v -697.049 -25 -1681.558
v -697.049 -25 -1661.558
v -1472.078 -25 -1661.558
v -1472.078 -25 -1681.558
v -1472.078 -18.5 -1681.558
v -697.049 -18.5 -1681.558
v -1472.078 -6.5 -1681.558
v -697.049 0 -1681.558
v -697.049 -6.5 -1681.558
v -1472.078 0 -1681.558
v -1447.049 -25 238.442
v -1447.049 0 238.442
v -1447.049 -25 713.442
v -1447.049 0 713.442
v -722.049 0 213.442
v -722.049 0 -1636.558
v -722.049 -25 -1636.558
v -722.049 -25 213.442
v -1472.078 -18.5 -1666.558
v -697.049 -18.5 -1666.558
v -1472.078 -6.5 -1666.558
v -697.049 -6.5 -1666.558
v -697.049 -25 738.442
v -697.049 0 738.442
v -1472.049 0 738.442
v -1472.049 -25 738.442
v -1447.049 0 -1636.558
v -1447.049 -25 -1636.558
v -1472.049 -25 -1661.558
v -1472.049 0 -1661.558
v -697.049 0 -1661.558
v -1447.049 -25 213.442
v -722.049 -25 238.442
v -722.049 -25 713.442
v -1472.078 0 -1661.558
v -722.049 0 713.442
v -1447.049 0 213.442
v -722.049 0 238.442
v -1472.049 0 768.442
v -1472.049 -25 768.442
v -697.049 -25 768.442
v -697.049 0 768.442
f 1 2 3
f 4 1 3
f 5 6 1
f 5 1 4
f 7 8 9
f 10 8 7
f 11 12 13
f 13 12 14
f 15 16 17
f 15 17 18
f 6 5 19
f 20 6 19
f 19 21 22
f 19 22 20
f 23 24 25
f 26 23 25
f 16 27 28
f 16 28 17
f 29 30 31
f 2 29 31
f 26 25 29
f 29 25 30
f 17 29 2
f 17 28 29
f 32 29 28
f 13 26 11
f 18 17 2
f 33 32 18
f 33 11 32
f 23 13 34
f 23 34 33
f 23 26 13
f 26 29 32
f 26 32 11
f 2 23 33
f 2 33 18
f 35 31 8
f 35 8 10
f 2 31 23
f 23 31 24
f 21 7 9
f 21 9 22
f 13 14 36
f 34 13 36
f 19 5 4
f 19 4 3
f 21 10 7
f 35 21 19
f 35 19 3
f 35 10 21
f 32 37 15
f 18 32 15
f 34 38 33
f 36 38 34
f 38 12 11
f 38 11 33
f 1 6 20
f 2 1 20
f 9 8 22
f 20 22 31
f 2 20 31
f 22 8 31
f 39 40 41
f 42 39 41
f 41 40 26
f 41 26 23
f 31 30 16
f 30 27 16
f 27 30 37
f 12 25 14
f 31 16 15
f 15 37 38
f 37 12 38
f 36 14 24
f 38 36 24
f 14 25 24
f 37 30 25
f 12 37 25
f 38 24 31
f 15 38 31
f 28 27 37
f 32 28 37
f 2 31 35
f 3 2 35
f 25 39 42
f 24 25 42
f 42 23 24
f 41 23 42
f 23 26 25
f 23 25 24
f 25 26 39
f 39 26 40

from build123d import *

# Parameters (mm, degrees)
F0_W     = 725
F0_H     = 1850
F0_H_2   = 475
F1_DEPTH = 25
F2_W     = 775.028976
F2_H     = 20
F3_DEPTH = 25
F4_W     = 12
F4_H     = 15
F5_DEPTH = 775.029975
F6_W     = 775
F6_H     = 30
F7_DEPTH = 25


with BuildPart() as f1:
    # F0 (on Front) → F1 (new body)
    with BuildSketch(Plane.XZ):
        Polygon((-697.048871, 738.441594), (-1472.048871, 738.441594), (-1472.048871, 238.441594), (-1472.048871, -1661.558406), (-697.048871, -1661.558406), (-697.048871, -1636.558406), (-697.048871, 213.441594), (-697.048871, 238.441594), (-697.048871, 713.441594), align=None)
        with Locations((-1084.548871, -711.558406)):
            Rectangle(F0_W, F0_H, mode=Mode.SUBTRACT)
        with Locations((-1084.548871, 475.941594)):
            Rectangle(F0_W, F0_H_2, mode=Mode.SUBTRACT)
    extrude(amount=F1_DEPTH)


with BuildPart() as f3:
    # F2 (on face) → F3 (new body)
    with BuildSketch(Plane(origin=(0, 0, 0), x_dir=(-1, 0, 0), z_dir=(0, 1, 0))):
        with Locations((1084.563359, -1671.558406)):
            Rectangle(F2_W, F2_H)
    extrude(amount=-F3_DEPTH)

    # F4 (on face) → F5 (cut, through all)
    with BuildSketch(Plane(origin=(-1472.077847, 0, 0), x_dir=(0, -1, 0), z_dir=(-1, 0, 0))):
        with Locations((12.5, -1674.058406)):
            Rectangle(F4_W, F4_H)
    extrude(amount=-F5_DEPTH, mode=Mode.SUBTRACT)


with BuildPart() as f7:
    # F6 (on face) → F7 (new body)
    with BuildSketch(Plane.XZ.offset(25)):
        with Locations((-1084.548871, 753.441594)):
            Rectangle(F6_W, F6_H)
    extrude(amount=-F7_DEPTH)


solid = Compound([f1.part, f3.part, f7.part])
